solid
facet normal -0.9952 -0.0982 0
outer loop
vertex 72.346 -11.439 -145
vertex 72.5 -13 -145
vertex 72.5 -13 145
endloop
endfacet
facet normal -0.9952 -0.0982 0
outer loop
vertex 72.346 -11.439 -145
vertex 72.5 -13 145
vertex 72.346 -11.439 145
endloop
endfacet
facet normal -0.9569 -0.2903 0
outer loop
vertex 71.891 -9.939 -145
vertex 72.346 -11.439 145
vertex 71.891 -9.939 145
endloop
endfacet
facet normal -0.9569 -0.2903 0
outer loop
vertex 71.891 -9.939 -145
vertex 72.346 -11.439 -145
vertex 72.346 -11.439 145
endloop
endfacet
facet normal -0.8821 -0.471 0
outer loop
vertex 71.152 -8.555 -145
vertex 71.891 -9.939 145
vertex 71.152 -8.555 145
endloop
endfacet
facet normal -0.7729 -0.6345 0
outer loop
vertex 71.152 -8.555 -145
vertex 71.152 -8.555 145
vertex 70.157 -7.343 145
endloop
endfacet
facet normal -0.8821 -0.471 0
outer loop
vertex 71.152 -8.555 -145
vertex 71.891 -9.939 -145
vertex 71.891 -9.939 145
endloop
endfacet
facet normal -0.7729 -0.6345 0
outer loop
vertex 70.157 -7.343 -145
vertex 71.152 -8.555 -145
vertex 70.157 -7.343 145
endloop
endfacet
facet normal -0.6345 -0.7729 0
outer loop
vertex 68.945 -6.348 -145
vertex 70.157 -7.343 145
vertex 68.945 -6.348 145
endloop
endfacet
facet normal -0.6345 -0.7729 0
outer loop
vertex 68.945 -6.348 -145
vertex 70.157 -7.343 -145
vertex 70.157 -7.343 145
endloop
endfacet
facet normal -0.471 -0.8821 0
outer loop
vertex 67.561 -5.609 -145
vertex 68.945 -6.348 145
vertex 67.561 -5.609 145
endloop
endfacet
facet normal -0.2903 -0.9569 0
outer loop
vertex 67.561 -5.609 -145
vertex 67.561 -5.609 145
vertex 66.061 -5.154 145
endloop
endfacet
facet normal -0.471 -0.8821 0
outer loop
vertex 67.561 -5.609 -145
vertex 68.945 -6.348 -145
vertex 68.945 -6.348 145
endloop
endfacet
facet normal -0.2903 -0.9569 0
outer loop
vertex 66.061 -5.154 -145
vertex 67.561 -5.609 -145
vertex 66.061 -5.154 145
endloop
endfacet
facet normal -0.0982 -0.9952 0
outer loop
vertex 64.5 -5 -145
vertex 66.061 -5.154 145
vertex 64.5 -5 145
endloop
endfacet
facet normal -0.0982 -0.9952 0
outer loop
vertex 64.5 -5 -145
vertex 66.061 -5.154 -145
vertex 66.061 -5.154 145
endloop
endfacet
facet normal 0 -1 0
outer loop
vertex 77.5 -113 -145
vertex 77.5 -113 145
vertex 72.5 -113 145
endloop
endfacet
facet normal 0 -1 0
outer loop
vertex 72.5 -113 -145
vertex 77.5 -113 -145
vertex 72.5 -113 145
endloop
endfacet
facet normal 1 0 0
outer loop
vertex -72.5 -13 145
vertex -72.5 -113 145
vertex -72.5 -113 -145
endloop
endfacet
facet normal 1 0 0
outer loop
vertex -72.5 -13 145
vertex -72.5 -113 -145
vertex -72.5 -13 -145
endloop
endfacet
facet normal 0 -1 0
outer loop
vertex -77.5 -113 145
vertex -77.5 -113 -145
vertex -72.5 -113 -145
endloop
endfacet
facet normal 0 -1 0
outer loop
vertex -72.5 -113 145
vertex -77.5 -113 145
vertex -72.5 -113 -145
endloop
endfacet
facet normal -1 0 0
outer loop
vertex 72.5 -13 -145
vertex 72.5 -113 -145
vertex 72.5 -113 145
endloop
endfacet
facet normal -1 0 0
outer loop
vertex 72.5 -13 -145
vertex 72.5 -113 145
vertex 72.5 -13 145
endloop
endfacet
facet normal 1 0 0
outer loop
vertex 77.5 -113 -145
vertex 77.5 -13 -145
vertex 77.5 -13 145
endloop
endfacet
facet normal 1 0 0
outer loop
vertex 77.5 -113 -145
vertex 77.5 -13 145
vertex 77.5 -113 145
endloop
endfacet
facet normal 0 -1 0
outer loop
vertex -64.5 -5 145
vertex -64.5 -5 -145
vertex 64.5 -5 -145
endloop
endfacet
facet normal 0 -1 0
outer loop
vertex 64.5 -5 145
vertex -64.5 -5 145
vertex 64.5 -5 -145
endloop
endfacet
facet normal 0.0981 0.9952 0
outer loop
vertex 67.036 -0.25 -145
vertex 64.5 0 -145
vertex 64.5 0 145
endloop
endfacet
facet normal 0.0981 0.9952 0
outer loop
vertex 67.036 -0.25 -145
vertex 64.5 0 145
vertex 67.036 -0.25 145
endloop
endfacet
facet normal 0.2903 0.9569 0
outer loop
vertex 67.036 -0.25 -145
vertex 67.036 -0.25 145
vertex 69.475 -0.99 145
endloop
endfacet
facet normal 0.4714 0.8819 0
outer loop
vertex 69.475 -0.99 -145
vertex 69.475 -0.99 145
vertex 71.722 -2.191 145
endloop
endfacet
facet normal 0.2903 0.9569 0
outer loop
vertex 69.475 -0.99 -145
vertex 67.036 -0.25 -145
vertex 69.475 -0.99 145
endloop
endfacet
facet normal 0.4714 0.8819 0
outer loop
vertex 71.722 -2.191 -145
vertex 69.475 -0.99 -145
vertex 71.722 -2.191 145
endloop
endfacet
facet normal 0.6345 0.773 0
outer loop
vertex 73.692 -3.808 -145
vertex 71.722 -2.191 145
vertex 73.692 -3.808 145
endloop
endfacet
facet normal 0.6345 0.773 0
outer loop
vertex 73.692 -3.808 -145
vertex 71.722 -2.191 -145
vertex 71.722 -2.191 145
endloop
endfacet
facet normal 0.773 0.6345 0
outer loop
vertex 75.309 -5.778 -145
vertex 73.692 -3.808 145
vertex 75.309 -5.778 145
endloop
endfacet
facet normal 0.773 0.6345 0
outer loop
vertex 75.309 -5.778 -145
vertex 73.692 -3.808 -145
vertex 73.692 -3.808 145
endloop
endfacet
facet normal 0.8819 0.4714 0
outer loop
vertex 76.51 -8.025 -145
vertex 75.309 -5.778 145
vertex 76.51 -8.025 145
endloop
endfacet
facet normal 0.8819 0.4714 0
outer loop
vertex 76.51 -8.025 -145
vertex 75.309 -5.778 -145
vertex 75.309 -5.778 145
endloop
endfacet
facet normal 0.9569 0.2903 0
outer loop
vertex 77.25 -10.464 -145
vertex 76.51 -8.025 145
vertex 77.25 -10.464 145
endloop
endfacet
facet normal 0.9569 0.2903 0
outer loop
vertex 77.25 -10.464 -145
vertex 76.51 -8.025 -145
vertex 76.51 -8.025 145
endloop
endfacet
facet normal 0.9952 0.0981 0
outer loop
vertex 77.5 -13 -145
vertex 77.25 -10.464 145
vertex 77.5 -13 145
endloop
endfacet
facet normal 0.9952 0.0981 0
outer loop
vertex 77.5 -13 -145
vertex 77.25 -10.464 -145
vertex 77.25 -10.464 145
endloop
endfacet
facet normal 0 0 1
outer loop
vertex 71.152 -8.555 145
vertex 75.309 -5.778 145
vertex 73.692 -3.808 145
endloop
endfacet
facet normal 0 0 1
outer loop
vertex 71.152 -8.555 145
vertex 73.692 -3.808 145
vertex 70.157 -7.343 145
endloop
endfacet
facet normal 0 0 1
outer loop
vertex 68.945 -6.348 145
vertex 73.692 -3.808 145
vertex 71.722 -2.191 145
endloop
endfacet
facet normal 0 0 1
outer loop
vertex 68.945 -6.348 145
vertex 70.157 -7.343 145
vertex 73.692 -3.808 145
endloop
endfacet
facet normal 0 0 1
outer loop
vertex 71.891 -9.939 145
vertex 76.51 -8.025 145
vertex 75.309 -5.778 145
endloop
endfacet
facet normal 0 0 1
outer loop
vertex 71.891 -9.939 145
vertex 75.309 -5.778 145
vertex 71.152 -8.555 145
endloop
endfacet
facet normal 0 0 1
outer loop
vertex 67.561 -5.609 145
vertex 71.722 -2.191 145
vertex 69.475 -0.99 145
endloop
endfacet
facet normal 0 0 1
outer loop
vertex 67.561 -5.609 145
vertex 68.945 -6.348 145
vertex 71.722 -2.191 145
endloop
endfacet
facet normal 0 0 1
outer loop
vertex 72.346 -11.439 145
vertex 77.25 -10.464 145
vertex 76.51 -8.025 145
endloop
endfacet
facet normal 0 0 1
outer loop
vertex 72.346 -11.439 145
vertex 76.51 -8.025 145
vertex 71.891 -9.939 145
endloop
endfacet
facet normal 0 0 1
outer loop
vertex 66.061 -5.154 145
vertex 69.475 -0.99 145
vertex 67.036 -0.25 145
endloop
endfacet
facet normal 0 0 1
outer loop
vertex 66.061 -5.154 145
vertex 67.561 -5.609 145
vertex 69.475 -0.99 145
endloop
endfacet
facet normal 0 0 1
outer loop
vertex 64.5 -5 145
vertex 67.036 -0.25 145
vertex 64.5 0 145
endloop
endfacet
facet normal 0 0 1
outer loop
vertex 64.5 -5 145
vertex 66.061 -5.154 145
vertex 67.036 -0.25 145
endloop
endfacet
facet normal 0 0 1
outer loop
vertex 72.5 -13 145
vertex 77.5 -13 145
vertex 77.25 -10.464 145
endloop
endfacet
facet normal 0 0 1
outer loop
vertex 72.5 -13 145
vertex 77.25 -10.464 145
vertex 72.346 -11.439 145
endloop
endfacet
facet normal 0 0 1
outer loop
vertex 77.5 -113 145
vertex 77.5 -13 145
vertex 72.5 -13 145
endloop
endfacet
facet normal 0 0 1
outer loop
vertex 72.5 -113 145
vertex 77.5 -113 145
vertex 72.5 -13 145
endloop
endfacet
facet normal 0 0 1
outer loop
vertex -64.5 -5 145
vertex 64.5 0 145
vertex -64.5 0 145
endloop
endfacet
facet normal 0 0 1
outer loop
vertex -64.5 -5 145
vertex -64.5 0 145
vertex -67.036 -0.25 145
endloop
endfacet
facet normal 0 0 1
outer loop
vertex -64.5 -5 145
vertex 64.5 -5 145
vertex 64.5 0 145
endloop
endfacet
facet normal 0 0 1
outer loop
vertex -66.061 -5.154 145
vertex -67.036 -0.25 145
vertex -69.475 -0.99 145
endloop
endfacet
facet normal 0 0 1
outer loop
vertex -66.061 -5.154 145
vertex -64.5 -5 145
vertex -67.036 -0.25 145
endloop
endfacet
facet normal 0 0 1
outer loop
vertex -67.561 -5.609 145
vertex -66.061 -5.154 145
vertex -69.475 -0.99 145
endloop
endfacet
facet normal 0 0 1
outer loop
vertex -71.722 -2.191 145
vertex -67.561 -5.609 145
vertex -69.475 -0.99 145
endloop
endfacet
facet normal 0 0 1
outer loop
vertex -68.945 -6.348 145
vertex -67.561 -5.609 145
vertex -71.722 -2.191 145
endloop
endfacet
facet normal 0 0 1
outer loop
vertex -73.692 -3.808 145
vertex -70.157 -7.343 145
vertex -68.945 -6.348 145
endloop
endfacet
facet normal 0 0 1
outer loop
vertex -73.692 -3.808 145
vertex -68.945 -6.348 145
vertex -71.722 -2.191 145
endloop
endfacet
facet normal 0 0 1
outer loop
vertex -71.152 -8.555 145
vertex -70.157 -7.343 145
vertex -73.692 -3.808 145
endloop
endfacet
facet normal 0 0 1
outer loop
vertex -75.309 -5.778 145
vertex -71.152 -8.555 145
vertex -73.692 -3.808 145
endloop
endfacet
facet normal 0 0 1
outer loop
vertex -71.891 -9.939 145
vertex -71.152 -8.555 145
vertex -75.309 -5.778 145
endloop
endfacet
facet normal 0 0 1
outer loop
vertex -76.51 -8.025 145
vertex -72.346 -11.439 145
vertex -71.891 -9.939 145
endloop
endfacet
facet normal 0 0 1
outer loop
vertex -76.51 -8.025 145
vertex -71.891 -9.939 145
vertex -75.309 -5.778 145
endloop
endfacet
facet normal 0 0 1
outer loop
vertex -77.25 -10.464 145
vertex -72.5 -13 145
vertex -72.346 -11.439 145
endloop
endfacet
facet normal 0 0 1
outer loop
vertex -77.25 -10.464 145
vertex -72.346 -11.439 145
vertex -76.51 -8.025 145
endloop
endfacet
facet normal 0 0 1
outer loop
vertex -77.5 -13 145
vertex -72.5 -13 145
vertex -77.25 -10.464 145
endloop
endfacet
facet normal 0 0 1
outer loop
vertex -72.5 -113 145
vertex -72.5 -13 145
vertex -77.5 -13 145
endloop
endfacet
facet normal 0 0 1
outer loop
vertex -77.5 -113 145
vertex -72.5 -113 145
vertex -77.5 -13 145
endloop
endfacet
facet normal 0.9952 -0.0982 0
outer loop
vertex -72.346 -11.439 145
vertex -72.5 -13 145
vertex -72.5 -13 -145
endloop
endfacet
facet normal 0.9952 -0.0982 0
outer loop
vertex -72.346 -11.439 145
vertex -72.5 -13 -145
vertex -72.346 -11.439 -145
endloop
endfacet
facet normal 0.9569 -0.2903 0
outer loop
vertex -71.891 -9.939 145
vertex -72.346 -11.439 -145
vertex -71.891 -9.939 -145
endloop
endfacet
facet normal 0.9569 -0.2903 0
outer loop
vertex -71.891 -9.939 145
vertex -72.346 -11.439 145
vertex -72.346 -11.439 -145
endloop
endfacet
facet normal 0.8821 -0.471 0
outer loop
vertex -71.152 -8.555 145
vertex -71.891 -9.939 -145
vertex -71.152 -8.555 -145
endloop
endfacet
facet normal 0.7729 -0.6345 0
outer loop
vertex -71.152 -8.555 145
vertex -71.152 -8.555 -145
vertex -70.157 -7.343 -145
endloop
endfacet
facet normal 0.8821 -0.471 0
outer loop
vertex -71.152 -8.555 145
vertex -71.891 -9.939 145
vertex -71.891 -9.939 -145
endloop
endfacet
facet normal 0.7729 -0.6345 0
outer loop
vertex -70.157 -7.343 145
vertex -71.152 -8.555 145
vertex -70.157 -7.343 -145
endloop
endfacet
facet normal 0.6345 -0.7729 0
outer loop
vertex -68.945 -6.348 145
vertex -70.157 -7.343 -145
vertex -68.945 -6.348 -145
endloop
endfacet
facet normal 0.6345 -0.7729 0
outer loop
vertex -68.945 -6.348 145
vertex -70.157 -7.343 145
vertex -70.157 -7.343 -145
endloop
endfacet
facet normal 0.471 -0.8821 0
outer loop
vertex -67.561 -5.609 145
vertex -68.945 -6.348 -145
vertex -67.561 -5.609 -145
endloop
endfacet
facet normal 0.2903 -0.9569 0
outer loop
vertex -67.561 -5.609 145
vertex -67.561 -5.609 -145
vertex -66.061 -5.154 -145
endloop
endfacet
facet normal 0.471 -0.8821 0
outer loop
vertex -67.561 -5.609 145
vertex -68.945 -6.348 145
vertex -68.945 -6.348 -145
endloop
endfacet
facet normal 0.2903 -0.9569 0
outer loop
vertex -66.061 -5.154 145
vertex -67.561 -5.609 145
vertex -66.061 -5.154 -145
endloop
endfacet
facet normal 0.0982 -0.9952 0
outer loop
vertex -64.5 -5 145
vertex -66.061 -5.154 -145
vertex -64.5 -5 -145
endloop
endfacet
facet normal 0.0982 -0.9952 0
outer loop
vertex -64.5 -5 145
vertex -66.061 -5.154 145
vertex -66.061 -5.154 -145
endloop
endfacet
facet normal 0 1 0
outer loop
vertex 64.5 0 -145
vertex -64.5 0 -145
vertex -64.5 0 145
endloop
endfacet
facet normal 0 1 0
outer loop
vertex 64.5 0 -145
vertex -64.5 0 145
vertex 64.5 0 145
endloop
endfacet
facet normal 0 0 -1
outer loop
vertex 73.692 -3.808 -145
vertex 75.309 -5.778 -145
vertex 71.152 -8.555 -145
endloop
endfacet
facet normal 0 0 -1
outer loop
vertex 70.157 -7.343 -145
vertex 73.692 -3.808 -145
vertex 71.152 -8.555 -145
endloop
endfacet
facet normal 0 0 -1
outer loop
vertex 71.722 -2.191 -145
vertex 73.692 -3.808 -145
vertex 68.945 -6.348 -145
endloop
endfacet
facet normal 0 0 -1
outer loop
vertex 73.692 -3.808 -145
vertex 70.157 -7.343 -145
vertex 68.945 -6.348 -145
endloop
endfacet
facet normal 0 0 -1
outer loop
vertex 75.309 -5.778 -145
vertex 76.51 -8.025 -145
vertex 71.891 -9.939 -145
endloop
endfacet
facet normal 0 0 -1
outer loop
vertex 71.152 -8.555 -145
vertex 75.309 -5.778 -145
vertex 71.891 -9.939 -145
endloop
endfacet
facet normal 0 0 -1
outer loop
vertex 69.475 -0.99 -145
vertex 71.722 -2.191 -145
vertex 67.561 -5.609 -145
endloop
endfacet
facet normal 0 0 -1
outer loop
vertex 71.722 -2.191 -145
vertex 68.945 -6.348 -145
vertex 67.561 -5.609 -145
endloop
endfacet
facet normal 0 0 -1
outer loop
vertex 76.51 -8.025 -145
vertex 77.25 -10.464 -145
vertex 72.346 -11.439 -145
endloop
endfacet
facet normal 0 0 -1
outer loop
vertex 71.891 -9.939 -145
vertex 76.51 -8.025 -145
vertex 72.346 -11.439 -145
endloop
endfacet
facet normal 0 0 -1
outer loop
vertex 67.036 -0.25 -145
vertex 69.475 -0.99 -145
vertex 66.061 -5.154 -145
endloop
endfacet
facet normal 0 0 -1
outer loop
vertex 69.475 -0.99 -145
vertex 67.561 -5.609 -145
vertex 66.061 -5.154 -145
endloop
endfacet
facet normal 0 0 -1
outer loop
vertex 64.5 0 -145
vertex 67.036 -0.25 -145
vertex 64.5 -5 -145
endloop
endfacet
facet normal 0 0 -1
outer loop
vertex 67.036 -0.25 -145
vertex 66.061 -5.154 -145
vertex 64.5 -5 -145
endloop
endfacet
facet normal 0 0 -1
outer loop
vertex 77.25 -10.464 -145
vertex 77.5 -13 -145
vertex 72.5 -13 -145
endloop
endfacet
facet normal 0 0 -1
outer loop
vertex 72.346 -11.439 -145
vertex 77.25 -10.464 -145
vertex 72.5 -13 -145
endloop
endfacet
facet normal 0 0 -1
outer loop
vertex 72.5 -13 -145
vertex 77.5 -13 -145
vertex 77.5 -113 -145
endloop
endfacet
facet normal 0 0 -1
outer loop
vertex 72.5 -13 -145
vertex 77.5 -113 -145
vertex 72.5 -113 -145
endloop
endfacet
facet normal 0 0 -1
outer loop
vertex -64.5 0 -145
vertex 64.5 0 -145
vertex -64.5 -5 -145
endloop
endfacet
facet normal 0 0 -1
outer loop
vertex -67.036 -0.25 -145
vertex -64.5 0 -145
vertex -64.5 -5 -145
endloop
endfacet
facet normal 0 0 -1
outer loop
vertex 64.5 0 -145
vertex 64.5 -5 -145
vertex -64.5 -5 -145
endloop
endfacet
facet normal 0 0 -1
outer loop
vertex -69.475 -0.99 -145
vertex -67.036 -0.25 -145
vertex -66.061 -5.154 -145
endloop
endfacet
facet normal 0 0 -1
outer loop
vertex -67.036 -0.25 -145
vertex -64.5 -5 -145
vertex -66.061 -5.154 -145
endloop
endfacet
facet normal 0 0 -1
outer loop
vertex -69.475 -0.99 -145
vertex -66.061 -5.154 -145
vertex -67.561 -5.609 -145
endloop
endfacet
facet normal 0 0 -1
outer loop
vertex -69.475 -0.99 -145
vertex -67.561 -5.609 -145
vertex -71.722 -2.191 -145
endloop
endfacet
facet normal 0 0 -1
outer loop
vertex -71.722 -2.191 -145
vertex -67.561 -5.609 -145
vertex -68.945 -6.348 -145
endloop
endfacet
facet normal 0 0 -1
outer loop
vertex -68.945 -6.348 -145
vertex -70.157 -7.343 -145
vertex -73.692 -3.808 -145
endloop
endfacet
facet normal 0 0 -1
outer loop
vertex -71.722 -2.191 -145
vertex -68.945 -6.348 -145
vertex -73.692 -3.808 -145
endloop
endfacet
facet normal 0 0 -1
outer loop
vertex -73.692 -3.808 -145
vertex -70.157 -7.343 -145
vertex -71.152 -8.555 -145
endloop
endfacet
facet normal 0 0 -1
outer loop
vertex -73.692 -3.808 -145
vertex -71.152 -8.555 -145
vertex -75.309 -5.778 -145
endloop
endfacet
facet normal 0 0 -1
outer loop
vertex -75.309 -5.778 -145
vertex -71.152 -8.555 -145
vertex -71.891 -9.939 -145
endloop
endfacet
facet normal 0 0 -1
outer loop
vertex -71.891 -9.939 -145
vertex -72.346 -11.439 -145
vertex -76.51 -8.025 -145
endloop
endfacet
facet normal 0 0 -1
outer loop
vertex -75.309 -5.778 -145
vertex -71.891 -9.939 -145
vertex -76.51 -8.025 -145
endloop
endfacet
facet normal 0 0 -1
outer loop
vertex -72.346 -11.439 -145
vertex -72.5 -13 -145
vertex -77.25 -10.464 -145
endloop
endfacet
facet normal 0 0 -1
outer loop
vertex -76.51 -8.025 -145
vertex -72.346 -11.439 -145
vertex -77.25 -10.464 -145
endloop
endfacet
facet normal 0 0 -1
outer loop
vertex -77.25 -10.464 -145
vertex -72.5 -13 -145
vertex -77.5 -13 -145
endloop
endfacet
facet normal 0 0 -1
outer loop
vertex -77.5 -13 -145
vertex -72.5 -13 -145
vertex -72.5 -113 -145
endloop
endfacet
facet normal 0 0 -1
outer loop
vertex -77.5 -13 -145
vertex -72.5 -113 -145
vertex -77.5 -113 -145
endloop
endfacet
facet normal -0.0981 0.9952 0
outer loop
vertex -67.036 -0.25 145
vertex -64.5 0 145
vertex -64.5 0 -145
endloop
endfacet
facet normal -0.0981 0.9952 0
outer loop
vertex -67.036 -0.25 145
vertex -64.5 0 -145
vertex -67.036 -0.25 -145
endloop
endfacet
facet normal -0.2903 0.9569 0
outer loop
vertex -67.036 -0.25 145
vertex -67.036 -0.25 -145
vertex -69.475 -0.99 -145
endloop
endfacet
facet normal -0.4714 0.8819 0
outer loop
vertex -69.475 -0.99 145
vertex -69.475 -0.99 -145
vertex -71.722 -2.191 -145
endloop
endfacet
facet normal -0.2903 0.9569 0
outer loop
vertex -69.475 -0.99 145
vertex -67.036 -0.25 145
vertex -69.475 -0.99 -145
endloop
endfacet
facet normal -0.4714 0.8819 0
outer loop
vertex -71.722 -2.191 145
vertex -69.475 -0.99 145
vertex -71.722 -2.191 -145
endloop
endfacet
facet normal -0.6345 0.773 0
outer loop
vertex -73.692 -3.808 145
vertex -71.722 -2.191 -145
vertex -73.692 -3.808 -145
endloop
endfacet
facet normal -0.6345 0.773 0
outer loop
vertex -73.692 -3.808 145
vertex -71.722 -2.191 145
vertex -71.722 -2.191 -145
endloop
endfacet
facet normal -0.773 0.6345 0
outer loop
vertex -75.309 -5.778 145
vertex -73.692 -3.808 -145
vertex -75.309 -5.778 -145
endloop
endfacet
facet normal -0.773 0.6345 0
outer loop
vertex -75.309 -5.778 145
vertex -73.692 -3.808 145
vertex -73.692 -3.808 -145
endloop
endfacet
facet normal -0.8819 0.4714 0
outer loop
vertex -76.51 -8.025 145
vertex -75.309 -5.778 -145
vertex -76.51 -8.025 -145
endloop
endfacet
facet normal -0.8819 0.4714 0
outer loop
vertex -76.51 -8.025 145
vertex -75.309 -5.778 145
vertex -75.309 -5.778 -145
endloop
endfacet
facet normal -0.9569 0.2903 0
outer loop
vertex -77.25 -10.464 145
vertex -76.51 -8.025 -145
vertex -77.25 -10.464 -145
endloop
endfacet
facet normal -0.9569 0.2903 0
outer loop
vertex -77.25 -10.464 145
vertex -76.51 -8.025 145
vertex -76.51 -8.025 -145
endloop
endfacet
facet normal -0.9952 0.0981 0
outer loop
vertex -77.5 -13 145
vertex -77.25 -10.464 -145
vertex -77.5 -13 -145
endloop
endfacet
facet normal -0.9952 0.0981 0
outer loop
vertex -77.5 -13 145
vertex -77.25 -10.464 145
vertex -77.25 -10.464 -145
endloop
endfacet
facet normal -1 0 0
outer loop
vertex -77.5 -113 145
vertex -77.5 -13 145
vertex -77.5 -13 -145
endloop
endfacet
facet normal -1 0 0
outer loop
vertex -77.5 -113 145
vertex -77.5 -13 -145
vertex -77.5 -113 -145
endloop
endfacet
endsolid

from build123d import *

# Parameters (mm, degrees)
SKETCH1_W                      = 155
SKETCH1_H                      = 290
BASE_FLANGE1_DEPTH             = 5
EDGE_FLANGE1_STRIP_W           = 36
EDGE_FLANGE1_STRIP_H           = 5
EDGE_FLANGE1_STRIP_CUT_DEPTH   = 290
EDGE_FLANGE1_STRIP_2_W         = 36
EDGE_FLANGE1_STRIP_2_H         = 5
EDGE_FLANGE1_STRIP_CUT_2_DEPTH = 290
EDGE_FLANGE1_DEPTH             = 290
EDGE_FLANGE1_BEND_DEPTH        = 290


# Sheet-metal steps are written as plain solids
with BuildPart() as part:
    # Sketch1 → Base-Flange1 (new body)
    with BuildSketch(Plane(origin=(0, 0, 0), x_dir=(1, 0, 0), z_dir=(0, 1, 0))):
        Rectangle(SKETCH1_W, SKETCH1_H)
    extrude(amount=-BASE_FLANGE1_DEPTH)

    # Edge-Flange1 strip (across the edge) → Edge-Flange1 strip cut (cut)
    with BuildSketch(Plane(origin=(77.5, -5, -145), x_dir=(-1, 0, 0), z_dir=(0, 0, 1))):
        with Locations((-5, -2.5)):
            Rectangle(EDGE_FLANGE1_STRIP_W, EDGE_FLANGE1_STRIP_H)
    extrude(amount=EDGE_FLANGE1_STRIP_CUT_DEPTH, mode=Mode.SUBTRACT)

    # Edge-Flange1 strip 2 (across the edge) → Edge-Flange1 strip cut 2 (cut)
    with BuildSketch(Plane(origin=(-77.5, -5, 145), x_dir=(1, 0, 0), z_dir=(0, 0, -1))):
        with Locations((-5, -2.5)):
            Rectangle(EDGE_FLANGE1_STRIP_2_W, EDGE_FLANGE1_STRIP_2_H)
    extrude(amount=EDGE_FLANGE1_STRIP_CUT_2_DEPTH, mode=Mode.SUBTRACT)

    # Edge-Flange1 section (across the edge) → Edge-Flange1 (add)
    with BuildSketch(Plane(origin=(77.5, -5, -145), x_dir=(-1, 0, 0), z_dir=(0, 0, 1))):
        with BuildLine():
            Line((0, 8), (0, 108))
            Line((0, 108), (5, 108))
            Line((5, 108), (5, 8))
            ThreePointArc((5, 8), (7.343145751, 2.343145751), (13, 0))
            Line((13, 0), (13, -5))
            ThreePointArc((13, -5), (3.807611845, -1.192388155), (0, 8))
        make_face()
    extrude(amount=EDGE_FLANGE1_DEPTH)

    # Edge-Flange1 section 2 (across the edge) → Edge-Flange1 bend (add)
    with BuildSketch(Plane(origin=(-77.5, -5, 145), x_dir=(1, 0, 0), z_dir=(0, 0, -1))):
        with BuildLine():
            Line((0, 8), (0, 108))
            Line((0, 108), (5, 108))
            Line((5, 108), (5, 8))
            ThreePointArc((5, 8), (7.343145751, 2.343145751), (13, 0))
            Line((13, 0), (13, -5))
            ThreePointArc((13, -5), (3.807611845, -1.192388155), (0, 8))
        make_face()
    extrude(amount=EDGE_FLANGE1_BEND_DEPTH)


solid = part.part
